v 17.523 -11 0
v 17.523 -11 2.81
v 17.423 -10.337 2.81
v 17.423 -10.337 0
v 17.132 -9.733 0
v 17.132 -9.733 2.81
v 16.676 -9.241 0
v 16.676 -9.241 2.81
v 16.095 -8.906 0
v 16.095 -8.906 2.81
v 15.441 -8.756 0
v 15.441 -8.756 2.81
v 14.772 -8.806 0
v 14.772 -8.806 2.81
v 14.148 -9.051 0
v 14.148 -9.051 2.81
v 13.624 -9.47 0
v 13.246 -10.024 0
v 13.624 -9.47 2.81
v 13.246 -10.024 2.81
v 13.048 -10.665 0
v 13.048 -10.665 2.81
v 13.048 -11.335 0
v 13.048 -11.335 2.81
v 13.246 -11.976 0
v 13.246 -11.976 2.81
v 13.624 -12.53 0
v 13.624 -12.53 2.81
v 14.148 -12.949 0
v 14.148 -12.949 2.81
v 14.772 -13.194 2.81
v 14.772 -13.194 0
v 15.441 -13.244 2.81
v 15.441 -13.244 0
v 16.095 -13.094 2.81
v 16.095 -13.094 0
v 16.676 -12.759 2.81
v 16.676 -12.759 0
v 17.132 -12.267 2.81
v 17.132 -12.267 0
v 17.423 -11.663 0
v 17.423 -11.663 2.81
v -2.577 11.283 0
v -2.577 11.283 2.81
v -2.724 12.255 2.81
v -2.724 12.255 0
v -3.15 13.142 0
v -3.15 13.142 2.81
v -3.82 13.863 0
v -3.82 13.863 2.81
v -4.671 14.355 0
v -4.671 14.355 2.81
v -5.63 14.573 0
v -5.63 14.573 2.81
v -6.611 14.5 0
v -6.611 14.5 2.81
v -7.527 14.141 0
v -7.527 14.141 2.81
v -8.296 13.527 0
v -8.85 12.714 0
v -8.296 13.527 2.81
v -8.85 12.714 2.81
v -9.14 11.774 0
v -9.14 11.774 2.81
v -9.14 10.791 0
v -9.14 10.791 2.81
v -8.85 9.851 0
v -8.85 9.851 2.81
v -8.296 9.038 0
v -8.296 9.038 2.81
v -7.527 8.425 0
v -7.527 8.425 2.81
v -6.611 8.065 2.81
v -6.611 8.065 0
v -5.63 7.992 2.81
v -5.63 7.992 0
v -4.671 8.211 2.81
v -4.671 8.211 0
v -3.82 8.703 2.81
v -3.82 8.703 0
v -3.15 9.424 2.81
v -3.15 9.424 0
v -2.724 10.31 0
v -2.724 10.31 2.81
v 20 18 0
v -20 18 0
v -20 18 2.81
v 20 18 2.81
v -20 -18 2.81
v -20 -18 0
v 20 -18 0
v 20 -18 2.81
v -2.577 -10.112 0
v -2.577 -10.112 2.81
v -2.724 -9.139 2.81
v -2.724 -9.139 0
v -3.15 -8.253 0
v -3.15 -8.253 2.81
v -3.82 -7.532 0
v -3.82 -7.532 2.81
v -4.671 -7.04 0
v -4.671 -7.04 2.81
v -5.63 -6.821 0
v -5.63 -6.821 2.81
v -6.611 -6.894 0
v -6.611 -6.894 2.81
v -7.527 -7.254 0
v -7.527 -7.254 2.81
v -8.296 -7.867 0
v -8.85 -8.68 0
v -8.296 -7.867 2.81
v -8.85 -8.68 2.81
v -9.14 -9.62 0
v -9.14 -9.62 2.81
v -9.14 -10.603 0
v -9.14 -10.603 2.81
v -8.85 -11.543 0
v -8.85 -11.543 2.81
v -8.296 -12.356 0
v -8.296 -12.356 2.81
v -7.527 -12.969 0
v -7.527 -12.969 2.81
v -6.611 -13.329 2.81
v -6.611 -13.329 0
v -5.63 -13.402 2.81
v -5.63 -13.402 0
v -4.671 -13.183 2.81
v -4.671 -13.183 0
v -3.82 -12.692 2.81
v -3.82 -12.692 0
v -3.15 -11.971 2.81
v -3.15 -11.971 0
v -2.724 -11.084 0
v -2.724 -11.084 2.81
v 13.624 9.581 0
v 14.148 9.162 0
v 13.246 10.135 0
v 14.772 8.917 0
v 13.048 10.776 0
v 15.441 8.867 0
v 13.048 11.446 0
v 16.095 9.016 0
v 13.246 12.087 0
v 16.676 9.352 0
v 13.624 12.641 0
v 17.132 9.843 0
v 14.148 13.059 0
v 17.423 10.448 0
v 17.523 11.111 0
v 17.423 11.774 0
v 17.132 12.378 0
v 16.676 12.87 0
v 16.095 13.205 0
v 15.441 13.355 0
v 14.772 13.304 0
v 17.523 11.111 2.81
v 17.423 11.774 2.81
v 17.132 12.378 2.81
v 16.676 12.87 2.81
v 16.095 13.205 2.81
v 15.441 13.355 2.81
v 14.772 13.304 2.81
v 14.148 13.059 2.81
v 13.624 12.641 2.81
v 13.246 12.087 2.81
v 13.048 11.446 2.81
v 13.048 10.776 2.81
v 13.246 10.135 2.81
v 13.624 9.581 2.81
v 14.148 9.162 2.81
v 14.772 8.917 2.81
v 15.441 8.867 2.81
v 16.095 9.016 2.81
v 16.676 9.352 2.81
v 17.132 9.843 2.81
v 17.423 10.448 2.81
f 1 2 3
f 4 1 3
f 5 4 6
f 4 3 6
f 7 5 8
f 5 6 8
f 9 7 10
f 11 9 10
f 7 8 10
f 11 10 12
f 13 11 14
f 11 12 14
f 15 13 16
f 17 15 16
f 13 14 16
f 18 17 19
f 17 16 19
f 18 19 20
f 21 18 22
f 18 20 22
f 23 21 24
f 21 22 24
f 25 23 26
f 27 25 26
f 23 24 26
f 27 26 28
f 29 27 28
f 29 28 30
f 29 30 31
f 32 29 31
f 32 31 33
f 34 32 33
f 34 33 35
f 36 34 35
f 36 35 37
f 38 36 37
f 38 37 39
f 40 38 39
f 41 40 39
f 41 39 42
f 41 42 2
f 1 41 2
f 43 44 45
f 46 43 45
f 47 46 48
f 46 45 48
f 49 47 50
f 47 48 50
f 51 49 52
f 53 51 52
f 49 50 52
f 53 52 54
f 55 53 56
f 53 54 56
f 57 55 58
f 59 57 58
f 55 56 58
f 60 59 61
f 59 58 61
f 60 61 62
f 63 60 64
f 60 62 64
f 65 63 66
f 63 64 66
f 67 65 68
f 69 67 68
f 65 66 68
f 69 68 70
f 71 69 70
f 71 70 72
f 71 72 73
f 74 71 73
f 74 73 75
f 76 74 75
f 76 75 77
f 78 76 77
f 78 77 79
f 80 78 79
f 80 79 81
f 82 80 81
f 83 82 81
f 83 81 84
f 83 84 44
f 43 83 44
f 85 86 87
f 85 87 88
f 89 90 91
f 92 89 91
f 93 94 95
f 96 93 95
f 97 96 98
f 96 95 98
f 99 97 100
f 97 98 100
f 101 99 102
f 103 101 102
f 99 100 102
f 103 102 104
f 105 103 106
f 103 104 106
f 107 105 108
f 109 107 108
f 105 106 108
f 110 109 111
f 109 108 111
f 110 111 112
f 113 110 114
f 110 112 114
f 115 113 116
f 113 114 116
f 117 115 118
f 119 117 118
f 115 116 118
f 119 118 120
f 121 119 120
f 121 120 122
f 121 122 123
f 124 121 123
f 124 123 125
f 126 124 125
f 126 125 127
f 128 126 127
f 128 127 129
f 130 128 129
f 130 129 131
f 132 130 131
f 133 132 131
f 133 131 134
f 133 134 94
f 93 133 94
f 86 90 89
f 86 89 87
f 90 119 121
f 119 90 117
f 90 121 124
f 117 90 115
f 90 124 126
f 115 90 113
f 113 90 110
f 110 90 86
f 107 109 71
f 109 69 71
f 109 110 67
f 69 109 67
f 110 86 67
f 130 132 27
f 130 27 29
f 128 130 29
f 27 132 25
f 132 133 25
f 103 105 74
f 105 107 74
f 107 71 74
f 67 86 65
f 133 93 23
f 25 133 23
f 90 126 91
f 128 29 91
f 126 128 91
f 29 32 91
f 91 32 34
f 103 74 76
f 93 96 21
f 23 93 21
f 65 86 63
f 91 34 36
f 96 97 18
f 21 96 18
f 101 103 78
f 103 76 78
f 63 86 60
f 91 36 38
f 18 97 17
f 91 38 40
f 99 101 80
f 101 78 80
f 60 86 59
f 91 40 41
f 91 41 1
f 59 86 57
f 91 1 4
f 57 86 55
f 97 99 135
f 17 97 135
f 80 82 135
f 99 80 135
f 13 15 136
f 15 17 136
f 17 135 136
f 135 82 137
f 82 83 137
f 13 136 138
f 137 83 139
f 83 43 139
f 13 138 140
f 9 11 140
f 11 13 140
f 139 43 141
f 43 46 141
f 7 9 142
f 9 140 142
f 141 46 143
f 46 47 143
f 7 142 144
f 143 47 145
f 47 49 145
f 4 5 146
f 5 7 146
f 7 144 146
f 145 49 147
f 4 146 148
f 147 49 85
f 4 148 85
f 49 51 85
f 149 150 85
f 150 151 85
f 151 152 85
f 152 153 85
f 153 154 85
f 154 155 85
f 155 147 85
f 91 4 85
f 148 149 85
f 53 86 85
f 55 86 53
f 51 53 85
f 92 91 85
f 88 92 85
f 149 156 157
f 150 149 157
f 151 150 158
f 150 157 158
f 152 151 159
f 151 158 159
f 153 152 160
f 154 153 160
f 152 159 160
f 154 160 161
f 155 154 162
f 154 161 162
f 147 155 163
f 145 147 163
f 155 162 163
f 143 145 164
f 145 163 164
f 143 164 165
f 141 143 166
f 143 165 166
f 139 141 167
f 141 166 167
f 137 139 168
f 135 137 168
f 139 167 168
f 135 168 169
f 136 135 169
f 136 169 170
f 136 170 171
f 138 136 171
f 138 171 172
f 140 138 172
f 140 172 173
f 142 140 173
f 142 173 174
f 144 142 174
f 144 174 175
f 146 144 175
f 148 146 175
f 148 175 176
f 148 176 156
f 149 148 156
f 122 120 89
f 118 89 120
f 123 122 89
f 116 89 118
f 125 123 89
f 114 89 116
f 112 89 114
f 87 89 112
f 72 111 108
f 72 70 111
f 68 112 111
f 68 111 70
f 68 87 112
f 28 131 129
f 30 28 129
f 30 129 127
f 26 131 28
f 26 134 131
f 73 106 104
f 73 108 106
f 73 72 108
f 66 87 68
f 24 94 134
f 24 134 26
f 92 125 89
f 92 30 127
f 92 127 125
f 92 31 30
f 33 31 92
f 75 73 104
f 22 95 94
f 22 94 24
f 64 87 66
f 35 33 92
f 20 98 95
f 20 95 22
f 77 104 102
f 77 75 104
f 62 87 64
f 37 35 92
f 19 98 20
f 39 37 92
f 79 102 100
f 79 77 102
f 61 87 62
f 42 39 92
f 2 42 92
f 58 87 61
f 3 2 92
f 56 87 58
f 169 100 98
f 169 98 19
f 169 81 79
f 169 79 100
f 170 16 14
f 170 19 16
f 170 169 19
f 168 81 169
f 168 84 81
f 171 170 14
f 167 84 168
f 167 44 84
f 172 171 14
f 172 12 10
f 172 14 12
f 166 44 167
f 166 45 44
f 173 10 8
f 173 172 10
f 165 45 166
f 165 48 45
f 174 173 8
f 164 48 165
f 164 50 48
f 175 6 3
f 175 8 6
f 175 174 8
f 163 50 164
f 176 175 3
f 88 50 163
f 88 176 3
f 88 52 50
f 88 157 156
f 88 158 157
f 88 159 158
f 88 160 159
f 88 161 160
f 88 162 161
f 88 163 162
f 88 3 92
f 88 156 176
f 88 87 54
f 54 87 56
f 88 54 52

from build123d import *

# Parameters (mm, degrees)
SKETCH1_W            = 40
SKETCH1_H            = 36
BOSS_EXTRUDE1_DEPTH  = 2.81
M4_CLEARANCE_HOLE1_D = 4.5
M6_CLEARANCE_HOLE1_D = 6.6


with BuildPart() as part:
    # Sketch1 → Boss-Extrude1 (new body)
    with BuildSketch(Plane.XY):
        Rectangle(SKETCH1_W, SKETCH1_H)
    extrude(amount=BOSS_EXTRUDE1_DEPTH)

    # M4 Clearance Hole1 (through all)
    with Locations(Plane(origin=(0, 0, 0), x_dir=(-1, 0, 0), z_dir=(0, 0, -1))):
        with Locations((-15.273020567, -10.999999997), (-15.273020567, 11.110907406)):
            Hole(M4_CLEARANCE_HOLE1_D / 2)

    # M6 Clearance Hole1 (through all)
    with Locations(Plane(origin=(0, 0, 0), x_dir=(-1, 0, 0), z_dir=(0, 0, -1))):
        with Locations((5.877074643, -10.111576322), (5.877074643, 11.282650508)):
            Hole(M6_CLEARANCE_HOLE1_D / 2)


solid = part.part
